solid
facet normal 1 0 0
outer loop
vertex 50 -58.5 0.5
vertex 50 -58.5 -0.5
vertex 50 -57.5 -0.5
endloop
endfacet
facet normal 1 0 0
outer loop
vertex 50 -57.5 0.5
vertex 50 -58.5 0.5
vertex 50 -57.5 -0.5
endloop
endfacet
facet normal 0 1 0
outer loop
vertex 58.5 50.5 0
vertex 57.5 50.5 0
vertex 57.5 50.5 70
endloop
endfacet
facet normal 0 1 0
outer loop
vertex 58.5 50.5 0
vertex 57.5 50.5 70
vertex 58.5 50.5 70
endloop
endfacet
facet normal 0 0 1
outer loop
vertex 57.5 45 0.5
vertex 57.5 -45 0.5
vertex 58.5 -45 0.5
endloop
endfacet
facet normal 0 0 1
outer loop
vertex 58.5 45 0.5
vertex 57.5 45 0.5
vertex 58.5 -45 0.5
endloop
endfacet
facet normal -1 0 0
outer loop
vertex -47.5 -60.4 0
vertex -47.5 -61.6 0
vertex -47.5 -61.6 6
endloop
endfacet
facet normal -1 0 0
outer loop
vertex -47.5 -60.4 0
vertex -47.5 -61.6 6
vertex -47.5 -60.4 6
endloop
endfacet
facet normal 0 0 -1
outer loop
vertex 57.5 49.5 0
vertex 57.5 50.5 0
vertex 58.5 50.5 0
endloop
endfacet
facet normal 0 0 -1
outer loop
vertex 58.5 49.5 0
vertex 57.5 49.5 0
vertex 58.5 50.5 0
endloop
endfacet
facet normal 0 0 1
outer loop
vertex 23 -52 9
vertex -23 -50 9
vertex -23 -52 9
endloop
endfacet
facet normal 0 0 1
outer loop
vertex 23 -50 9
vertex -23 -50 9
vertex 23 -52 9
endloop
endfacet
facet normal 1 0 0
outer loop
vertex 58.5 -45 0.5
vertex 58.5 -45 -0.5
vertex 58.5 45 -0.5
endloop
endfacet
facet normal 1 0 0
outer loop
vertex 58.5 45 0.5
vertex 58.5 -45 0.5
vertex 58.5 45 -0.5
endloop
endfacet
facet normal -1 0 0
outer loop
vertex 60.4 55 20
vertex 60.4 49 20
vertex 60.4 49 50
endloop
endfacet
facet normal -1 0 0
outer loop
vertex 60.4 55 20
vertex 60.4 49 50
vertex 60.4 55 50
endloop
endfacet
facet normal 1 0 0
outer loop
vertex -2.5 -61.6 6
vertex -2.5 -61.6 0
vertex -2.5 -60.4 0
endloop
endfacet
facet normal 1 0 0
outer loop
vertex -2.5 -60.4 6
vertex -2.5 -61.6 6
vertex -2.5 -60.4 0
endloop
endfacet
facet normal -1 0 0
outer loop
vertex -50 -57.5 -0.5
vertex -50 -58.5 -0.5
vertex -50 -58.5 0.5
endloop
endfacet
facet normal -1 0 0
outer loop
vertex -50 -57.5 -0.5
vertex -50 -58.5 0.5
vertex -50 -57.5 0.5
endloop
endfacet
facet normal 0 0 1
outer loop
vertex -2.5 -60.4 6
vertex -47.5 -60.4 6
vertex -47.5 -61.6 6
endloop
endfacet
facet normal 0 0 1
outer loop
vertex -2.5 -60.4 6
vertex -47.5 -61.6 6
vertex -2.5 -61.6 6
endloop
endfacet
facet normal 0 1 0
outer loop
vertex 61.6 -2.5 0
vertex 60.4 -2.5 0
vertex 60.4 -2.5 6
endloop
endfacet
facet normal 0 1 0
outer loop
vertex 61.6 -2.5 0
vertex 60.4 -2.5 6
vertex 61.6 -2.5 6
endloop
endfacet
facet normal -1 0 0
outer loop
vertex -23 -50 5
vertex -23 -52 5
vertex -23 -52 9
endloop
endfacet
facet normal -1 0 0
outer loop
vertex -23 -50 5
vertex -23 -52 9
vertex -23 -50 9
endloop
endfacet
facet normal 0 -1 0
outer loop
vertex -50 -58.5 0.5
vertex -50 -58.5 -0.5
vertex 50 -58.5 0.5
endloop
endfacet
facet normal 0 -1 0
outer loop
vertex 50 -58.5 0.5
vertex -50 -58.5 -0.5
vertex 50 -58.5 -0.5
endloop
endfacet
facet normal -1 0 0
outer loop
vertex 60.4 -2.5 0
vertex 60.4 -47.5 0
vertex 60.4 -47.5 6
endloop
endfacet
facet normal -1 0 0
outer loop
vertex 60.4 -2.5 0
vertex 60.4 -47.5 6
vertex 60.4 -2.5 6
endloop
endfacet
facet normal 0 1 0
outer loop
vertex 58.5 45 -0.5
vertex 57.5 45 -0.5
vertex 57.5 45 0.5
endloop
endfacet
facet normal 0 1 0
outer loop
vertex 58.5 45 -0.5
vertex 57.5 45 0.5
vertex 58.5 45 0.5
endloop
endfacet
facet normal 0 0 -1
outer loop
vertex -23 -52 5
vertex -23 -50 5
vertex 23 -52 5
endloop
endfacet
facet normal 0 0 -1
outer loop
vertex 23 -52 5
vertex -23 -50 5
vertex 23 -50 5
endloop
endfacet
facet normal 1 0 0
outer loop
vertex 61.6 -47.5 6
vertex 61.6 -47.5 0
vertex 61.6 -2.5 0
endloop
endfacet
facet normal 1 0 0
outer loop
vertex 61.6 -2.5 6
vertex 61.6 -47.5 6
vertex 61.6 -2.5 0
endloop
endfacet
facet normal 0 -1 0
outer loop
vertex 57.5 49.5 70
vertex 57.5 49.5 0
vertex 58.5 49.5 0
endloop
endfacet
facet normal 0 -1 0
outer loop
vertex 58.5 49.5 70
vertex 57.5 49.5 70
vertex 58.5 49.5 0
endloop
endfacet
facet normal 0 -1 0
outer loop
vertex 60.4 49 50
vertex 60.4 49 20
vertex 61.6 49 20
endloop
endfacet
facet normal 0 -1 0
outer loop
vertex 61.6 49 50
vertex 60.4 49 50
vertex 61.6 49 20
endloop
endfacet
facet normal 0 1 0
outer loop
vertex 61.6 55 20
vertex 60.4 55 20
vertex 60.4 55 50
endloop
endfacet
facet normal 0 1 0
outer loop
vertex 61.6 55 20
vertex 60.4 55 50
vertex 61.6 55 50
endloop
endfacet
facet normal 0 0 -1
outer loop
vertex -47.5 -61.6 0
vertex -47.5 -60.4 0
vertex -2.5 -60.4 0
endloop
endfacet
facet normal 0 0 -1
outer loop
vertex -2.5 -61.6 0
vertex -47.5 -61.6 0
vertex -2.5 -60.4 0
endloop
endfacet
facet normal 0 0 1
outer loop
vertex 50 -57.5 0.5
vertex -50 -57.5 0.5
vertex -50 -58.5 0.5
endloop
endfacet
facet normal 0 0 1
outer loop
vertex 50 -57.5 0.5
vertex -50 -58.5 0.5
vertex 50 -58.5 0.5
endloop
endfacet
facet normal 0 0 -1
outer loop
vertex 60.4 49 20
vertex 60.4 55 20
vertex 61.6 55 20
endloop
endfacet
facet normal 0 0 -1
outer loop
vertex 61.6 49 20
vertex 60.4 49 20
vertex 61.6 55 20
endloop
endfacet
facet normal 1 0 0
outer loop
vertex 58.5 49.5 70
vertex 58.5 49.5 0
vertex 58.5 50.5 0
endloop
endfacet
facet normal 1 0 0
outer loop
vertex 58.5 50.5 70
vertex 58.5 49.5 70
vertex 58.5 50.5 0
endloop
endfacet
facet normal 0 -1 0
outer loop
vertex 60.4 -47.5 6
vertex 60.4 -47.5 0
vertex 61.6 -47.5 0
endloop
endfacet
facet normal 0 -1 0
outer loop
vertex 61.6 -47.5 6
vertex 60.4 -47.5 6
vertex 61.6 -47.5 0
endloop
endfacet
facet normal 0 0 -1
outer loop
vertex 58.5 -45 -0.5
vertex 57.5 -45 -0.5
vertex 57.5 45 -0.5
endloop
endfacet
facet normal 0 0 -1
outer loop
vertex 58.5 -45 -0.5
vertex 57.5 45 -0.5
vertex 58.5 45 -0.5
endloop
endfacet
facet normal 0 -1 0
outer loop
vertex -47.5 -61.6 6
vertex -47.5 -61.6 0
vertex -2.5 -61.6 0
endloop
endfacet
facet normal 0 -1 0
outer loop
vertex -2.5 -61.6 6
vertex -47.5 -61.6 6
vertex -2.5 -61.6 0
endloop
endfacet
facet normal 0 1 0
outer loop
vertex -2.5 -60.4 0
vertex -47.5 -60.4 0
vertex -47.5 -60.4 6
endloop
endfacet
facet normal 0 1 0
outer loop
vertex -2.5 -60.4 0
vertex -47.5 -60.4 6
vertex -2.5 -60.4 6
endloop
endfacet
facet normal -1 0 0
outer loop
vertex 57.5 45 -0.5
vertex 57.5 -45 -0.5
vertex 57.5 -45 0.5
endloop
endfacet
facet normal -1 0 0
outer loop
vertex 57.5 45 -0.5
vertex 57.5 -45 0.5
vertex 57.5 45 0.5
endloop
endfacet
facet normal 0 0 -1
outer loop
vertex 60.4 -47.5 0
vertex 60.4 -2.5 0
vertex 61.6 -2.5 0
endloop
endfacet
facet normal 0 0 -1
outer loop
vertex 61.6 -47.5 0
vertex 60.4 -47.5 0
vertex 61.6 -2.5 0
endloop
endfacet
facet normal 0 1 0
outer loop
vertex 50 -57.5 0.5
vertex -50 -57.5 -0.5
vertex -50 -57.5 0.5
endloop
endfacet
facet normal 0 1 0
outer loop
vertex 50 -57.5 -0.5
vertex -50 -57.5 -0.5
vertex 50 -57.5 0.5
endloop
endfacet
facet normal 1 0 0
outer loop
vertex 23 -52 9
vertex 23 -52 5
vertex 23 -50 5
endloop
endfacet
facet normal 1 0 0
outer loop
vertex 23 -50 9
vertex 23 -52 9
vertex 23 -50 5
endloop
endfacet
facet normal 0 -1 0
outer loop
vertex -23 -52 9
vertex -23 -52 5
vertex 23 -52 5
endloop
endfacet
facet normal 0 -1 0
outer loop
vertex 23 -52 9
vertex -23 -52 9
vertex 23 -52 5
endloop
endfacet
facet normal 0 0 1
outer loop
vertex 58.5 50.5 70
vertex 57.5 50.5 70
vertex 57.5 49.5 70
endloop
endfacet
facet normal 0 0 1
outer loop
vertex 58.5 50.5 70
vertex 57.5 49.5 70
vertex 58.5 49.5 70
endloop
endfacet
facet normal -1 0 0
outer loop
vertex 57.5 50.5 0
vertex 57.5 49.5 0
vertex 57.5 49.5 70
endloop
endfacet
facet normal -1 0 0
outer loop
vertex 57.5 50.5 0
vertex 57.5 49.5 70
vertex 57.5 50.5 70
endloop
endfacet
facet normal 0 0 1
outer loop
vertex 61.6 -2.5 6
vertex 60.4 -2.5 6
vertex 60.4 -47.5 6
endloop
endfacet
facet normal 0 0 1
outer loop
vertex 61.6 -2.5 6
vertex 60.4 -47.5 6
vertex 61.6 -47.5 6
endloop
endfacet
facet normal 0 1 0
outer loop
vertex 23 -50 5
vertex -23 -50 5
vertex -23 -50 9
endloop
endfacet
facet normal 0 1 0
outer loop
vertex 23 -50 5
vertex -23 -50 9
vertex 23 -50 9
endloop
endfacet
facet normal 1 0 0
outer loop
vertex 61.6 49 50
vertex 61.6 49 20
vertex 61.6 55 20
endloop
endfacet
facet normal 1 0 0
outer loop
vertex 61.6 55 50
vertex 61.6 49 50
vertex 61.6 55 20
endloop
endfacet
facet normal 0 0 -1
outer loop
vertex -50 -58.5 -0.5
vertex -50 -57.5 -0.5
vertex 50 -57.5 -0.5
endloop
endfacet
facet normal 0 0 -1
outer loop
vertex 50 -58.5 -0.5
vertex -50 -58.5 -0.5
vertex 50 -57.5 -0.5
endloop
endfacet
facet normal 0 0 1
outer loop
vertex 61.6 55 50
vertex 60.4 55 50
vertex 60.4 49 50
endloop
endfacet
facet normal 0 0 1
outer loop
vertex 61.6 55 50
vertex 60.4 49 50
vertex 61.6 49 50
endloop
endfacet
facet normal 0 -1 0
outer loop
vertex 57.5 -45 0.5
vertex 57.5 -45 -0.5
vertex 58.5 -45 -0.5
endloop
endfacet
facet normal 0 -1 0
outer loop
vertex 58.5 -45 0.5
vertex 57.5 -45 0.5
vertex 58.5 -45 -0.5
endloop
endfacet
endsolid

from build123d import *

# Parameters (mm, degrees)
OVERALL_START                                = -0.5
SKETCH_1_W                                   = 100
SKETCH_1_H                                   = 1
OVERALL_X_DIMENSION_MARKER_BODY_LENGTH_DEPTH = 1
SKETCH_2_W                                   = 1
SKETCH_2_H                                   = 90
OVERALL_Y_DIMENSION_MARKER_BODY_WIDTH_DEPTH  = 1
SKETCH_3_W                                   = 1
SKETCH_3_H                                   = 1
OVERALL_Z_DIMENSION_MARKER_BODY_HEIGHT_DEPTH = 70
FRONT_START                                  = 5
SKETCH_4_W                                   = 46
SKETCH_4_H                                   = 2
FRONT_ARROW_SENSOR_FACE_MARKER_DEPTH         = 4
SKETCH_5_W                                   = 45
SKETCH_5_H                                   = 1.2
OVERALL_LABEL_PLATE_100MM_DEPTH              = 6
SKETCH_6_W                                   = 1.2
SKETCH_6_H                                   = 45
OVERALL_LABEL_PLATE_90MM_DEPTH               = 6
OVERALL_START_2                              = 20
SKETCH_7_W                                   = 1.2
SKETCH_7_H                                   = 6
OVERALL_LABEL_PLATE_70MM_DEPTH               = 30


with BuildPart() as part:
    # 草图1 → overall X dimension marker - body length 100 mm (new body)
    with BuildSketch(Plane.XY.offset(OVERALL_START)):
        with Locations((0, -58)):
            Rectangle(SKETCH_1_W, SKETCH_1_H)
    extrude(amount=OVERALL_X_DIMENSION_MARKER_BODY_LENGTH_DEPTH)


with BuildPart() as body_2:
    # 草图2 → overall Y dimension marker - body width 90 mm (new body)
    with BuildSketch(Plane.XY.offset(OVERALL_START)):
        with Locations((58, 0)):
            Rectangle(SKETCH_2_W, SKETCH_2_H)
    extrude(amount=OVERALL_Y_DIMENSION_MARKER_BODY_WIDTH_DEPTH)


with BuildPart() as body_3:
    # 草图3 → overall Z dimension marker - body height 70 mm (new body)
    with BuildSketch(Plane.XY):
        with Locations((58, 50)):
            Rectangle(SKETCH_3_W, SKETCH_3_H)
    extrude(amount=OVERALL_Z_DIMENSION_MARKER_BODY_HEIGHT_DEPTH)


with BuildPart() as body_4:
    # 草图4 → front arrow / sensor face marker (new body)
    with BuildSketch(Plane.XY.offset(FRONT_START)):
        with Locations((0, -51)):
            Rectangle(SKETCH_4_W, SKETCH_4_H)
    extrude(amount=FRONT_ARROW_SENSOR_FACE_MARKER_DEPTH)


with BuildPart() as body_5:
    # 草图5 → overall label plate - 100mm (new body)
    with BuildSketch(Plane.XY):
        with Locations((-25, -61)):
            Rectangle(SKETCH_5_W, SKETCH_5_H)
    extrude(amount=OVERALL_LABEL_PLATE_100MM_DEPTH)


with BuildPart() as body_6:
    # 草图6 → overall label plate - 90mm (new body)
    with BuildSketch(Plane.XY):
        with Locations((61, -25)):
            Rectangle(SKETCH_6_W, SKETCH_6_H)
    extrude(amount=OVERALL_LABEL_PLATE_90MM_DEPTH)


with BuildPart() as body_7:
    # 草图7 → overall label plate - 70mm (new body)
    with BuildSketch(Plane.XY.offset(OVERALL_START_2)):
        with Locations((61, 52)):
            Rectangle(SKETCH_7_W, SKETCH_7_H)
    extrude(amount=OVERALL_LABEL_PLATE_70MM_DEPTH)


solid = Compound([part.part, body_2.part, body_3.part, body_4.part, body_5.part, body_6.part, body_7.part])
